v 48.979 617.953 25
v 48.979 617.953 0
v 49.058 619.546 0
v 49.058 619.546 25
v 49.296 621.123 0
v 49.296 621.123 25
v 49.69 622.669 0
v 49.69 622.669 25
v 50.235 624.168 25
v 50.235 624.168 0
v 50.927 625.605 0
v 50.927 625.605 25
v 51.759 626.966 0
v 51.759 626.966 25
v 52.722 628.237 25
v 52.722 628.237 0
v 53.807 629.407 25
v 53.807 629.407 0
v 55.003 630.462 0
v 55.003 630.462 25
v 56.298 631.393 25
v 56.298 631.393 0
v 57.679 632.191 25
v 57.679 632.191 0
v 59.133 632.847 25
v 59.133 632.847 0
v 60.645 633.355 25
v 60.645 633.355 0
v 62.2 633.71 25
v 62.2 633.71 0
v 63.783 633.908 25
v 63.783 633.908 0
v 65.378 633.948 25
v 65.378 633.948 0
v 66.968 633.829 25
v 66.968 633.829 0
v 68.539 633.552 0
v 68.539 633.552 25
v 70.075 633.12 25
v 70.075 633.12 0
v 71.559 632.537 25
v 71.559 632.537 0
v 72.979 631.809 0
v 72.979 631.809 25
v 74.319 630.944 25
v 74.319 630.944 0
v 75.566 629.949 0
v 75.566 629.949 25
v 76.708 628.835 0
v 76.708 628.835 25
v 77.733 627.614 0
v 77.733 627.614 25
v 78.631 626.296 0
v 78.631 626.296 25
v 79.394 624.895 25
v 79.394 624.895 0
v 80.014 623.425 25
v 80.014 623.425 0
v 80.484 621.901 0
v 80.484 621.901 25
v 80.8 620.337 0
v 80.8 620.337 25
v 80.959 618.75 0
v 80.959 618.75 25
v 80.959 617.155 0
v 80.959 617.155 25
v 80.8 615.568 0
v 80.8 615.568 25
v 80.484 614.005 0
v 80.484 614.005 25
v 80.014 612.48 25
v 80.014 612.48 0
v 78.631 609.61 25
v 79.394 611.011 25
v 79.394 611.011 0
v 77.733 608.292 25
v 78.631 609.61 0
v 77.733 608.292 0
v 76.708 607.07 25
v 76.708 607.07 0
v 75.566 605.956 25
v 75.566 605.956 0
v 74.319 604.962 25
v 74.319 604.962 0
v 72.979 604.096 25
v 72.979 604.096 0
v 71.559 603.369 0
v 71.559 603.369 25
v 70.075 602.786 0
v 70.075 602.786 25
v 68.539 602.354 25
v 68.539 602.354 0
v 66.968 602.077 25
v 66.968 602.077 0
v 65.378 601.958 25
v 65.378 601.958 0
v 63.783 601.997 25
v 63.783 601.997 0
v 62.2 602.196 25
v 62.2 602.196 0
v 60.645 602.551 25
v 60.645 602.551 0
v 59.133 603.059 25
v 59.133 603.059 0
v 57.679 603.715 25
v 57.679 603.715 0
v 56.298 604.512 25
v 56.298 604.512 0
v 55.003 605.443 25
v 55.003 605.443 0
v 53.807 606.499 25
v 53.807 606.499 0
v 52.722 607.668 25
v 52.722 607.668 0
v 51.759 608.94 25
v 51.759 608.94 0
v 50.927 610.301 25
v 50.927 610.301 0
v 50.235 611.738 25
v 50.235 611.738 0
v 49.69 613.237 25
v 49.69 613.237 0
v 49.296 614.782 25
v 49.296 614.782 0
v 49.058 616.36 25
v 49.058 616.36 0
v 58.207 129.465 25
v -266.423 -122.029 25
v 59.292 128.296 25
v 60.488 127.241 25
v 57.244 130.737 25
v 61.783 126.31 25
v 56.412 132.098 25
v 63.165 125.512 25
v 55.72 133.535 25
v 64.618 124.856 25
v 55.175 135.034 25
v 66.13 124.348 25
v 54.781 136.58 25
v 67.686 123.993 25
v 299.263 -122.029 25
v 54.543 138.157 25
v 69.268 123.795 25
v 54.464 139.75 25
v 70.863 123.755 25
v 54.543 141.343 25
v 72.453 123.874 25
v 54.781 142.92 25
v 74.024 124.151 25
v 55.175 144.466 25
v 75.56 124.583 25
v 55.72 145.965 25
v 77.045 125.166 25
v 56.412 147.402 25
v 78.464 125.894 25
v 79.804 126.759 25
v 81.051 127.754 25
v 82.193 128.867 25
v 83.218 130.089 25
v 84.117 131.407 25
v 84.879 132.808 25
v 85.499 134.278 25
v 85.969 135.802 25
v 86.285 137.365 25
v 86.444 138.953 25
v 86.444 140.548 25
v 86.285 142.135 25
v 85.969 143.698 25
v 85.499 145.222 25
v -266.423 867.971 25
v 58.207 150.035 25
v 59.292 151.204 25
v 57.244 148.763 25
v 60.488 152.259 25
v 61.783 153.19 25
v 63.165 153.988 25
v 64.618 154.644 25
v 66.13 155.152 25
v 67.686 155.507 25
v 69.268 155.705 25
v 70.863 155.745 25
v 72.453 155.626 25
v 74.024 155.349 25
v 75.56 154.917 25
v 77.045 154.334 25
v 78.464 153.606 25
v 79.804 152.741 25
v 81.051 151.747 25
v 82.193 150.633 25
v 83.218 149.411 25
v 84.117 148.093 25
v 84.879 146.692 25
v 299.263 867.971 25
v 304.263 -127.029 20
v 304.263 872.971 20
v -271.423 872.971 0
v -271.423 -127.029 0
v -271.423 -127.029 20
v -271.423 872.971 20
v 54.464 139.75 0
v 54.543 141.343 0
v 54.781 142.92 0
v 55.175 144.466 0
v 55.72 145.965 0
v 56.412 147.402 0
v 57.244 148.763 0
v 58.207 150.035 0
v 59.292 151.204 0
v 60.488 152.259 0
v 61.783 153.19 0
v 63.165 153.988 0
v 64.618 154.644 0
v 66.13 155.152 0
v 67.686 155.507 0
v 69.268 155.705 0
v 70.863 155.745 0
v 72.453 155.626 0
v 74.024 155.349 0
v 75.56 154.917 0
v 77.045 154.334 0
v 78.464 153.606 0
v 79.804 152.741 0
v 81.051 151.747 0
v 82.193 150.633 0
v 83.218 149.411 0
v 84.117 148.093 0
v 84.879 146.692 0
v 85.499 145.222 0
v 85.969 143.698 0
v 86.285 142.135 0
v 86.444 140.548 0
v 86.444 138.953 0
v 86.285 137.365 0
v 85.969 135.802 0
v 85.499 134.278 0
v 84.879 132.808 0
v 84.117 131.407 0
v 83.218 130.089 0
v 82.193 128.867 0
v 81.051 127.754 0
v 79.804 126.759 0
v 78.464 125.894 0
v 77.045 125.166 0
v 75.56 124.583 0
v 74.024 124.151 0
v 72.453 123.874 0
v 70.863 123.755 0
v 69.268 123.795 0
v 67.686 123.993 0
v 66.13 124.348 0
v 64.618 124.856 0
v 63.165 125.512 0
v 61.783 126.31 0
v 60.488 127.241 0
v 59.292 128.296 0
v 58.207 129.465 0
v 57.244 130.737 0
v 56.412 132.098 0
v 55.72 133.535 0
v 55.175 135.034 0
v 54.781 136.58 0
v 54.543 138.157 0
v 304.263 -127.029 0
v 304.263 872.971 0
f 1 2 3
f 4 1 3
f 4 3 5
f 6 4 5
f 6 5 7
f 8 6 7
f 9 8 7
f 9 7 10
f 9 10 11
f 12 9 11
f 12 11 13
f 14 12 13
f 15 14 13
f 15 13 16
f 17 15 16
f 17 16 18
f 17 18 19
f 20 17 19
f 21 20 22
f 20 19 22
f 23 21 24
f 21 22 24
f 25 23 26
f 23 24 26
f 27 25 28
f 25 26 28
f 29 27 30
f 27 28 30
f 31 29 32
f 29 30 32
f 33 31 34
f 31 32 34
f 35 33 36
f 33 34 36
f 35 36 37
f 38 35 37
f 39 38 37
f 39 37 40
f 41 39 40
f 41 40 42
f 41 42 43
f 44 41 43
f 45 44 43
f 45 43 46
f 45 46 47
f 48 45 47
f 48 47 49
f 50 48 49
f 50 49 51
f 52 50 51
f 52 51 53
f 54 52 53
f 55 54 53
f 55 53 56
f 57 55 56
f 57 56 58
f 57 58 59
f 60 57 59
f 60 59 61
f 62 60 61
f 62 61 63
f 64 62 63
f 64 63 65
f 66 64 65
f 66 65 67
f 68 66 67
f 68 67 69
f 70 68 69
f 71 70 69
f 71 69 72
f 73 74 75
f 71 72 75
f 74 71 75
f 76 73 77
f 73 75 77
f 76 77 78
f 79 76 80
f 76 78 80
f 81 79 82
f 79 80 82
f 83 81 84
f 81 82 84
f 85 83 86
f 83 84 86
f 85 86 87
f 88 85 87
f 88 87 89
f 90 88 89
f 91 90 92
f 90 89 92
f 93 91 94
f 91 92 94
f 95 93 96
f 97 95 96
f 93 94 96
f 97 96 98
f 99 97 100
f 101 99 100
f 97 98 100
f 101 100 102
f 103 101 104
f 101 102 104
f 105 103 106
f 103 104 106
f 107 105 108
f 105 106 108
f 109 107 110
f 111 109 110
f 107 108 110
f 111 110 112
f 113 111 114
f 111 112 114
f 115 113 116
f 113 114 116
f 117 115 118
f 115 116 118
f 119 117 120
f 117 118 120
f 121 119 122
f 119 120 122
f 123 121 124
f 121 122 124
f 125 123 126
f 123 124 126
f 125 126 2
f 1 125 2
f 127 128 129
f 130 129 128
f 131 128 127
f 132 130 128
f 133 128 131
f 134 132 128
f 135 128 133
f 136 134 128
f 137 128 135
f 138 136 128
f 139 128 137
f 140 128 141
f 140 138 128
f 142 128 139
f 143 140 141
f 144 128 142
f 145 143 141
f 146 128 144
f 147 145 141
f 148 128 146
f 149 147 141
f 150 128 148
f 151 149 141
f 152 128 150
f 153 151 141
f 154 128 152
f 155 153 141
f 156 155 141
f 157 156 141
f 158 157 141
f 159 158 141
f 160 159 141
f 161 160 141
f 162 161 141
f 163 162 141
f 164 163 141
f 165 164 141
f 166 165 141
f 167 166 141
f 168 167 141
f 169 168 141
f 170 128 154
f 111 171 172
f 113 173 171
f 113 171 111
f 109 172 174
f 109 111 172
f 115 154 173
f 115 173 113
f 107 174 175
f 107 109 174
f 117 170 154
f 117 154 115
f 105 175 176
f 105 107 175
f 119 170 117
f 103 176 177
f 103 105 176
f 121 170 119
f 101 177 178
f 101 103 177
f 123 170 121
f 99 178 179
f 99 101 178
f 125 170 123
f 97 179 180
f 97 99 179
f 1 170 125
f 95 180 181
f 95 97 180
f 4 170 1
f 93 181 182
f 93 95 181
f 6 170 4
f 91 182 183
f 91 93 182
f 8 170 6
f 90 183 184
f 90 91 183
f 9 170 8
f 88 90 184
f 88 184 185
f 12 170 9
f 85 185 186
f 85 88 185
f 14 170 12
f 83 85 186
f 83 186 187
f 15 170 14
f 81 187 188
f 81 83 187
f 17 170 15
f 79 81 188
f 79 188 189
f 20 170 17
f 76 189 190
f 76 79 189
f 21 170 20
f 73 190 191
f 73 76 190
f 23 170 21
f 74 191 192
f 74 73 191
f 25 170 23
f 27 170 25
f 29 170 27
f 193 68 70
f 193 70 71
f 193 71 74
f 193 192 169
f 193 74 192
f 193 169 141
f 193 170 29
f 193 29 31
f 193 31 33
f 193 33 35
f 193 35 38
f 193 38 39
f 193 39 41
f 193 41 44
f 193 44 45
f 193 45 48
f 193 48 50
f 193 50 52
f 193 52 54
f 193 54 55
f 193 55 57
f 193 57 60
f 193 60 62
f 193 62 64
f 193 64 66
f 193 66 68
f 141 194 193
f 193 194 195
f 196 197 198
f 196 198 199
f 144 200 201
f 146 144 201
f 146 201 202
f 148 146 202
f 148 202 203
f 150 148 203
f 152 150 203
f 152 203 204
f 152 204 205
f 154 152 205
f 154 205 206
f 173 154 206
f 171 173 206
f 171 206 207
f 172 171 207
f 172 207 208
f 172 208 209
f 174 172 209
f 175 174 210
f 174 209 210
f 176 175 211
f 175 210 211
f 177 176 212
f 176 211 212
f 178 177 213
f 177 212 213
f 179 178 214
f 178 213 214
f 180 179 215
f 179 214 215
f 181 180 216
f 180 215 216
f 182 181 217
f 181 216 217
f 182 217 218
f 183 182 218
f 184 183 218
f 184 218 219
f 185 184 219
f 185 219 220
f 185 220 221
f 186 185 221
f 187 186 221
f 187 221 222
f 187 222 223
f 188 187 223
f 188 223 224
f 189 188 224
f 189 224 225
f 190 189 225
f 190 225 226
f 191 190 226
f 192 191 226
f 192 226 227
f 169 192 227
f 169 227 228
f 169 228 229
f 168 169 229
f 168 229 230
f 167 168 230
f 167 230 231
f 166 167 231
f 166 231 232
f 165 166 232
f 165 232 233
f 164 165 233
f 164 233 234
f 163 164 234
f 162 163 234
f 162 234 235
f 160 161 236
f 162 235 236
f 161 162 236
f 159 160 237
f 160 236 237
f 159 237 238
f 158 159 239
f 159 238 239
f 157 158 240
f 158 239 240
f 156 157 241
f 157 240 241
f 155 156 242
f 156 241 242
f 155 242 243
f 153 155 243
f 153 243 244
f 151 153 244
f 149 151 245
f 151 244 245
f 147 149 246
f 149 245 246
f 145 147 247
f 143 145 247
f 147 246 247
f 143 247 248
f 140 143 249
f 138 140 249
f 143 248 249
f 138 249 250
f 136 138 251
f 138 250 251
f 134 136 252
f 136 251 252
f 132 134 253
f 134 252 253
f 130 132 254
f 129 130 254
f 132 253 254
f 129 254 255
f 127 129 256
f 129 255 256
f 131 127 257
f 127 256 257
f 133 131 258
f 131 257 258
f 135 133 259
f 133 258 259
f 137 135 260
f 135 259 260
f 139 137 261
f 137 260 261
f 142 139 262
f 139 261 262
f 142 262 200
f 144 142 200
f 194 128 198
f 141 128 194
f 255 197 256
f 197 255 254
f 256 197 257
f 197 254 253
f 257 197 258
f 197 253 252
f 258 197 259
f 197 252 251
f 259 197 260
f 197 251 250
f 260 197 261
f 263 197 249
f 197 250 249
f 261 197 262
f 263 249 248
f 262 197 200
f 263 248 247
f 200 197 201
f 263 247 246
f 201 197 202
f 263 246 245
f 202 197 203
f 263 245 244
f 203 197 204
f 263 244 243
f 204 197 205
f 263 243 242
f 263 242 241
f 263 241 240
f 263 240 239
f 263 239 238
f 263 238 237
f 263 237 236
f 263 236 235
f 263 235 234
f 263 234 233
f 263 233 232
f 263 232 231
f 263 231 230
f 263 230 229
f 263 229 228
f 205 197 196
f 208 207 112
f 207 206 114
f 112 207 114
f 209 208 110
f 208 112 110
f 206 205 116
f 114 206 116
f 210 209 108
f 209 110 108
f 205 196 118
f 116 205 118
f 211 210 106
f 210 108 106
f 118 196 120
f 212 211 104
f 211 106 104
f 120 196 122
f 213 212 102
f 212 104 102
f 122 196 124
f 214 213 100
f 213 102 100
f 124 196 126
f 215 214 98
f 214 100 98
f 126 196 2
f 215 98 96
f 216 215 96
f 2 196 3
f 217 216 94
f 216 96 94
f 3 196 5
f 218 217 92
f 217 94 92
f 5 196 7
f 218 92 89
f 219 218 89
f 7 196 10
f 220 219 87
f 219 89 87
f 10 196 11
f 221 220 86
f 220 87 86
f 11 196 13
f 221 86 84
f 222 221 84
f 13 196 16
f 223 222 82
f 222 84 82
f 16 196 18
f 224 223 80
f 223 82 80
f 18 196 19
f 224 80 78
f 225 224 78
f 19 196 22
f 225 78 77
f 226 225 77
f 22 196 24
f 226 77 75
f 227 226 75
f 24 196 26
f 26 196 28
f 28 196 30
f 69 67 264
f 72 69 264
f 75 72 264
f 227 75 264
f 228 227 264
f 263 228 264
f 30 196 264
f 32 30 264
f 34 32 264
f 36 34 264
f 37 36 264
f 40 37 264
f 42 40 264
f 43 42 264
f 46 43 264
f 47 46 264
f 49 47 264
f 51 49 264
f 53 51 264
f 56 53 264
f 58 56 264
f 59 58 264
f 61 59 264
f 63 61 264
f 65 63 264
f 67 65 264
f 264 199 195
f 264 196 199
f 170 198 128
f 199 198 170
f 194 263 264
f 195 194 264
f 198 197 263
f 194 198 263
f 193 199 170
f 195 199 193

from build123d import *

# Parameters (mm, degrees)
F0_W     = 575.685959
F0_H     = 1000
F1_DEPTH = 25
F3_SIZE  = 5
F4_SIZE  = 5
F5_SIZE  = 5
F6_SIZE  = 5
F8_D     = 32


with BuildPart() as f1:
    # F0 (on Top) → F1 (new body)
    with BuildSketch(Plane.XY):
        with Locations((16.41995, 372.970969)):
            Rectangle(F0_W, F0_H)
    extrude(amount=F1_DEPTH)

    # F3
    f3_edges = [f1.edges().sort_by_distance(p)[0] for p in [
        (16.419951, -127.029031, 25),
    ]]
    chamfer(f3_edges, length=F3_SIZE)

    # F4
    f4_edges = [f1.edges().sort_by_distance(p)[0] for p in [
        (304.26293, 375.470969, 25),
    ]]
    chamfer(f4_edges, length=F4_SIZE)

    # F5
    f5_edges = [f1.edges().sort_by_distance(p)[0] for p in [
        (-271.423029, 375.470969, 25),
    ]]
    chamfer(f5_edges, length=F5_SIZE)

    # F6
    f6_edges = [f1.edges().sort_by_distance(p)[0] for p in [
        (16.419951, 872.970969, 25),
    ]]
    chamfer(f6_edges, length=F6_SIZE)

    # F8 (through all)
    with Locations(Plane.XY.offset(25)):
        with Locations((64.978719, 617.952704), (70.463941, 139.750063)):
            Hole(F8_D / 2)


solid = f1.part
